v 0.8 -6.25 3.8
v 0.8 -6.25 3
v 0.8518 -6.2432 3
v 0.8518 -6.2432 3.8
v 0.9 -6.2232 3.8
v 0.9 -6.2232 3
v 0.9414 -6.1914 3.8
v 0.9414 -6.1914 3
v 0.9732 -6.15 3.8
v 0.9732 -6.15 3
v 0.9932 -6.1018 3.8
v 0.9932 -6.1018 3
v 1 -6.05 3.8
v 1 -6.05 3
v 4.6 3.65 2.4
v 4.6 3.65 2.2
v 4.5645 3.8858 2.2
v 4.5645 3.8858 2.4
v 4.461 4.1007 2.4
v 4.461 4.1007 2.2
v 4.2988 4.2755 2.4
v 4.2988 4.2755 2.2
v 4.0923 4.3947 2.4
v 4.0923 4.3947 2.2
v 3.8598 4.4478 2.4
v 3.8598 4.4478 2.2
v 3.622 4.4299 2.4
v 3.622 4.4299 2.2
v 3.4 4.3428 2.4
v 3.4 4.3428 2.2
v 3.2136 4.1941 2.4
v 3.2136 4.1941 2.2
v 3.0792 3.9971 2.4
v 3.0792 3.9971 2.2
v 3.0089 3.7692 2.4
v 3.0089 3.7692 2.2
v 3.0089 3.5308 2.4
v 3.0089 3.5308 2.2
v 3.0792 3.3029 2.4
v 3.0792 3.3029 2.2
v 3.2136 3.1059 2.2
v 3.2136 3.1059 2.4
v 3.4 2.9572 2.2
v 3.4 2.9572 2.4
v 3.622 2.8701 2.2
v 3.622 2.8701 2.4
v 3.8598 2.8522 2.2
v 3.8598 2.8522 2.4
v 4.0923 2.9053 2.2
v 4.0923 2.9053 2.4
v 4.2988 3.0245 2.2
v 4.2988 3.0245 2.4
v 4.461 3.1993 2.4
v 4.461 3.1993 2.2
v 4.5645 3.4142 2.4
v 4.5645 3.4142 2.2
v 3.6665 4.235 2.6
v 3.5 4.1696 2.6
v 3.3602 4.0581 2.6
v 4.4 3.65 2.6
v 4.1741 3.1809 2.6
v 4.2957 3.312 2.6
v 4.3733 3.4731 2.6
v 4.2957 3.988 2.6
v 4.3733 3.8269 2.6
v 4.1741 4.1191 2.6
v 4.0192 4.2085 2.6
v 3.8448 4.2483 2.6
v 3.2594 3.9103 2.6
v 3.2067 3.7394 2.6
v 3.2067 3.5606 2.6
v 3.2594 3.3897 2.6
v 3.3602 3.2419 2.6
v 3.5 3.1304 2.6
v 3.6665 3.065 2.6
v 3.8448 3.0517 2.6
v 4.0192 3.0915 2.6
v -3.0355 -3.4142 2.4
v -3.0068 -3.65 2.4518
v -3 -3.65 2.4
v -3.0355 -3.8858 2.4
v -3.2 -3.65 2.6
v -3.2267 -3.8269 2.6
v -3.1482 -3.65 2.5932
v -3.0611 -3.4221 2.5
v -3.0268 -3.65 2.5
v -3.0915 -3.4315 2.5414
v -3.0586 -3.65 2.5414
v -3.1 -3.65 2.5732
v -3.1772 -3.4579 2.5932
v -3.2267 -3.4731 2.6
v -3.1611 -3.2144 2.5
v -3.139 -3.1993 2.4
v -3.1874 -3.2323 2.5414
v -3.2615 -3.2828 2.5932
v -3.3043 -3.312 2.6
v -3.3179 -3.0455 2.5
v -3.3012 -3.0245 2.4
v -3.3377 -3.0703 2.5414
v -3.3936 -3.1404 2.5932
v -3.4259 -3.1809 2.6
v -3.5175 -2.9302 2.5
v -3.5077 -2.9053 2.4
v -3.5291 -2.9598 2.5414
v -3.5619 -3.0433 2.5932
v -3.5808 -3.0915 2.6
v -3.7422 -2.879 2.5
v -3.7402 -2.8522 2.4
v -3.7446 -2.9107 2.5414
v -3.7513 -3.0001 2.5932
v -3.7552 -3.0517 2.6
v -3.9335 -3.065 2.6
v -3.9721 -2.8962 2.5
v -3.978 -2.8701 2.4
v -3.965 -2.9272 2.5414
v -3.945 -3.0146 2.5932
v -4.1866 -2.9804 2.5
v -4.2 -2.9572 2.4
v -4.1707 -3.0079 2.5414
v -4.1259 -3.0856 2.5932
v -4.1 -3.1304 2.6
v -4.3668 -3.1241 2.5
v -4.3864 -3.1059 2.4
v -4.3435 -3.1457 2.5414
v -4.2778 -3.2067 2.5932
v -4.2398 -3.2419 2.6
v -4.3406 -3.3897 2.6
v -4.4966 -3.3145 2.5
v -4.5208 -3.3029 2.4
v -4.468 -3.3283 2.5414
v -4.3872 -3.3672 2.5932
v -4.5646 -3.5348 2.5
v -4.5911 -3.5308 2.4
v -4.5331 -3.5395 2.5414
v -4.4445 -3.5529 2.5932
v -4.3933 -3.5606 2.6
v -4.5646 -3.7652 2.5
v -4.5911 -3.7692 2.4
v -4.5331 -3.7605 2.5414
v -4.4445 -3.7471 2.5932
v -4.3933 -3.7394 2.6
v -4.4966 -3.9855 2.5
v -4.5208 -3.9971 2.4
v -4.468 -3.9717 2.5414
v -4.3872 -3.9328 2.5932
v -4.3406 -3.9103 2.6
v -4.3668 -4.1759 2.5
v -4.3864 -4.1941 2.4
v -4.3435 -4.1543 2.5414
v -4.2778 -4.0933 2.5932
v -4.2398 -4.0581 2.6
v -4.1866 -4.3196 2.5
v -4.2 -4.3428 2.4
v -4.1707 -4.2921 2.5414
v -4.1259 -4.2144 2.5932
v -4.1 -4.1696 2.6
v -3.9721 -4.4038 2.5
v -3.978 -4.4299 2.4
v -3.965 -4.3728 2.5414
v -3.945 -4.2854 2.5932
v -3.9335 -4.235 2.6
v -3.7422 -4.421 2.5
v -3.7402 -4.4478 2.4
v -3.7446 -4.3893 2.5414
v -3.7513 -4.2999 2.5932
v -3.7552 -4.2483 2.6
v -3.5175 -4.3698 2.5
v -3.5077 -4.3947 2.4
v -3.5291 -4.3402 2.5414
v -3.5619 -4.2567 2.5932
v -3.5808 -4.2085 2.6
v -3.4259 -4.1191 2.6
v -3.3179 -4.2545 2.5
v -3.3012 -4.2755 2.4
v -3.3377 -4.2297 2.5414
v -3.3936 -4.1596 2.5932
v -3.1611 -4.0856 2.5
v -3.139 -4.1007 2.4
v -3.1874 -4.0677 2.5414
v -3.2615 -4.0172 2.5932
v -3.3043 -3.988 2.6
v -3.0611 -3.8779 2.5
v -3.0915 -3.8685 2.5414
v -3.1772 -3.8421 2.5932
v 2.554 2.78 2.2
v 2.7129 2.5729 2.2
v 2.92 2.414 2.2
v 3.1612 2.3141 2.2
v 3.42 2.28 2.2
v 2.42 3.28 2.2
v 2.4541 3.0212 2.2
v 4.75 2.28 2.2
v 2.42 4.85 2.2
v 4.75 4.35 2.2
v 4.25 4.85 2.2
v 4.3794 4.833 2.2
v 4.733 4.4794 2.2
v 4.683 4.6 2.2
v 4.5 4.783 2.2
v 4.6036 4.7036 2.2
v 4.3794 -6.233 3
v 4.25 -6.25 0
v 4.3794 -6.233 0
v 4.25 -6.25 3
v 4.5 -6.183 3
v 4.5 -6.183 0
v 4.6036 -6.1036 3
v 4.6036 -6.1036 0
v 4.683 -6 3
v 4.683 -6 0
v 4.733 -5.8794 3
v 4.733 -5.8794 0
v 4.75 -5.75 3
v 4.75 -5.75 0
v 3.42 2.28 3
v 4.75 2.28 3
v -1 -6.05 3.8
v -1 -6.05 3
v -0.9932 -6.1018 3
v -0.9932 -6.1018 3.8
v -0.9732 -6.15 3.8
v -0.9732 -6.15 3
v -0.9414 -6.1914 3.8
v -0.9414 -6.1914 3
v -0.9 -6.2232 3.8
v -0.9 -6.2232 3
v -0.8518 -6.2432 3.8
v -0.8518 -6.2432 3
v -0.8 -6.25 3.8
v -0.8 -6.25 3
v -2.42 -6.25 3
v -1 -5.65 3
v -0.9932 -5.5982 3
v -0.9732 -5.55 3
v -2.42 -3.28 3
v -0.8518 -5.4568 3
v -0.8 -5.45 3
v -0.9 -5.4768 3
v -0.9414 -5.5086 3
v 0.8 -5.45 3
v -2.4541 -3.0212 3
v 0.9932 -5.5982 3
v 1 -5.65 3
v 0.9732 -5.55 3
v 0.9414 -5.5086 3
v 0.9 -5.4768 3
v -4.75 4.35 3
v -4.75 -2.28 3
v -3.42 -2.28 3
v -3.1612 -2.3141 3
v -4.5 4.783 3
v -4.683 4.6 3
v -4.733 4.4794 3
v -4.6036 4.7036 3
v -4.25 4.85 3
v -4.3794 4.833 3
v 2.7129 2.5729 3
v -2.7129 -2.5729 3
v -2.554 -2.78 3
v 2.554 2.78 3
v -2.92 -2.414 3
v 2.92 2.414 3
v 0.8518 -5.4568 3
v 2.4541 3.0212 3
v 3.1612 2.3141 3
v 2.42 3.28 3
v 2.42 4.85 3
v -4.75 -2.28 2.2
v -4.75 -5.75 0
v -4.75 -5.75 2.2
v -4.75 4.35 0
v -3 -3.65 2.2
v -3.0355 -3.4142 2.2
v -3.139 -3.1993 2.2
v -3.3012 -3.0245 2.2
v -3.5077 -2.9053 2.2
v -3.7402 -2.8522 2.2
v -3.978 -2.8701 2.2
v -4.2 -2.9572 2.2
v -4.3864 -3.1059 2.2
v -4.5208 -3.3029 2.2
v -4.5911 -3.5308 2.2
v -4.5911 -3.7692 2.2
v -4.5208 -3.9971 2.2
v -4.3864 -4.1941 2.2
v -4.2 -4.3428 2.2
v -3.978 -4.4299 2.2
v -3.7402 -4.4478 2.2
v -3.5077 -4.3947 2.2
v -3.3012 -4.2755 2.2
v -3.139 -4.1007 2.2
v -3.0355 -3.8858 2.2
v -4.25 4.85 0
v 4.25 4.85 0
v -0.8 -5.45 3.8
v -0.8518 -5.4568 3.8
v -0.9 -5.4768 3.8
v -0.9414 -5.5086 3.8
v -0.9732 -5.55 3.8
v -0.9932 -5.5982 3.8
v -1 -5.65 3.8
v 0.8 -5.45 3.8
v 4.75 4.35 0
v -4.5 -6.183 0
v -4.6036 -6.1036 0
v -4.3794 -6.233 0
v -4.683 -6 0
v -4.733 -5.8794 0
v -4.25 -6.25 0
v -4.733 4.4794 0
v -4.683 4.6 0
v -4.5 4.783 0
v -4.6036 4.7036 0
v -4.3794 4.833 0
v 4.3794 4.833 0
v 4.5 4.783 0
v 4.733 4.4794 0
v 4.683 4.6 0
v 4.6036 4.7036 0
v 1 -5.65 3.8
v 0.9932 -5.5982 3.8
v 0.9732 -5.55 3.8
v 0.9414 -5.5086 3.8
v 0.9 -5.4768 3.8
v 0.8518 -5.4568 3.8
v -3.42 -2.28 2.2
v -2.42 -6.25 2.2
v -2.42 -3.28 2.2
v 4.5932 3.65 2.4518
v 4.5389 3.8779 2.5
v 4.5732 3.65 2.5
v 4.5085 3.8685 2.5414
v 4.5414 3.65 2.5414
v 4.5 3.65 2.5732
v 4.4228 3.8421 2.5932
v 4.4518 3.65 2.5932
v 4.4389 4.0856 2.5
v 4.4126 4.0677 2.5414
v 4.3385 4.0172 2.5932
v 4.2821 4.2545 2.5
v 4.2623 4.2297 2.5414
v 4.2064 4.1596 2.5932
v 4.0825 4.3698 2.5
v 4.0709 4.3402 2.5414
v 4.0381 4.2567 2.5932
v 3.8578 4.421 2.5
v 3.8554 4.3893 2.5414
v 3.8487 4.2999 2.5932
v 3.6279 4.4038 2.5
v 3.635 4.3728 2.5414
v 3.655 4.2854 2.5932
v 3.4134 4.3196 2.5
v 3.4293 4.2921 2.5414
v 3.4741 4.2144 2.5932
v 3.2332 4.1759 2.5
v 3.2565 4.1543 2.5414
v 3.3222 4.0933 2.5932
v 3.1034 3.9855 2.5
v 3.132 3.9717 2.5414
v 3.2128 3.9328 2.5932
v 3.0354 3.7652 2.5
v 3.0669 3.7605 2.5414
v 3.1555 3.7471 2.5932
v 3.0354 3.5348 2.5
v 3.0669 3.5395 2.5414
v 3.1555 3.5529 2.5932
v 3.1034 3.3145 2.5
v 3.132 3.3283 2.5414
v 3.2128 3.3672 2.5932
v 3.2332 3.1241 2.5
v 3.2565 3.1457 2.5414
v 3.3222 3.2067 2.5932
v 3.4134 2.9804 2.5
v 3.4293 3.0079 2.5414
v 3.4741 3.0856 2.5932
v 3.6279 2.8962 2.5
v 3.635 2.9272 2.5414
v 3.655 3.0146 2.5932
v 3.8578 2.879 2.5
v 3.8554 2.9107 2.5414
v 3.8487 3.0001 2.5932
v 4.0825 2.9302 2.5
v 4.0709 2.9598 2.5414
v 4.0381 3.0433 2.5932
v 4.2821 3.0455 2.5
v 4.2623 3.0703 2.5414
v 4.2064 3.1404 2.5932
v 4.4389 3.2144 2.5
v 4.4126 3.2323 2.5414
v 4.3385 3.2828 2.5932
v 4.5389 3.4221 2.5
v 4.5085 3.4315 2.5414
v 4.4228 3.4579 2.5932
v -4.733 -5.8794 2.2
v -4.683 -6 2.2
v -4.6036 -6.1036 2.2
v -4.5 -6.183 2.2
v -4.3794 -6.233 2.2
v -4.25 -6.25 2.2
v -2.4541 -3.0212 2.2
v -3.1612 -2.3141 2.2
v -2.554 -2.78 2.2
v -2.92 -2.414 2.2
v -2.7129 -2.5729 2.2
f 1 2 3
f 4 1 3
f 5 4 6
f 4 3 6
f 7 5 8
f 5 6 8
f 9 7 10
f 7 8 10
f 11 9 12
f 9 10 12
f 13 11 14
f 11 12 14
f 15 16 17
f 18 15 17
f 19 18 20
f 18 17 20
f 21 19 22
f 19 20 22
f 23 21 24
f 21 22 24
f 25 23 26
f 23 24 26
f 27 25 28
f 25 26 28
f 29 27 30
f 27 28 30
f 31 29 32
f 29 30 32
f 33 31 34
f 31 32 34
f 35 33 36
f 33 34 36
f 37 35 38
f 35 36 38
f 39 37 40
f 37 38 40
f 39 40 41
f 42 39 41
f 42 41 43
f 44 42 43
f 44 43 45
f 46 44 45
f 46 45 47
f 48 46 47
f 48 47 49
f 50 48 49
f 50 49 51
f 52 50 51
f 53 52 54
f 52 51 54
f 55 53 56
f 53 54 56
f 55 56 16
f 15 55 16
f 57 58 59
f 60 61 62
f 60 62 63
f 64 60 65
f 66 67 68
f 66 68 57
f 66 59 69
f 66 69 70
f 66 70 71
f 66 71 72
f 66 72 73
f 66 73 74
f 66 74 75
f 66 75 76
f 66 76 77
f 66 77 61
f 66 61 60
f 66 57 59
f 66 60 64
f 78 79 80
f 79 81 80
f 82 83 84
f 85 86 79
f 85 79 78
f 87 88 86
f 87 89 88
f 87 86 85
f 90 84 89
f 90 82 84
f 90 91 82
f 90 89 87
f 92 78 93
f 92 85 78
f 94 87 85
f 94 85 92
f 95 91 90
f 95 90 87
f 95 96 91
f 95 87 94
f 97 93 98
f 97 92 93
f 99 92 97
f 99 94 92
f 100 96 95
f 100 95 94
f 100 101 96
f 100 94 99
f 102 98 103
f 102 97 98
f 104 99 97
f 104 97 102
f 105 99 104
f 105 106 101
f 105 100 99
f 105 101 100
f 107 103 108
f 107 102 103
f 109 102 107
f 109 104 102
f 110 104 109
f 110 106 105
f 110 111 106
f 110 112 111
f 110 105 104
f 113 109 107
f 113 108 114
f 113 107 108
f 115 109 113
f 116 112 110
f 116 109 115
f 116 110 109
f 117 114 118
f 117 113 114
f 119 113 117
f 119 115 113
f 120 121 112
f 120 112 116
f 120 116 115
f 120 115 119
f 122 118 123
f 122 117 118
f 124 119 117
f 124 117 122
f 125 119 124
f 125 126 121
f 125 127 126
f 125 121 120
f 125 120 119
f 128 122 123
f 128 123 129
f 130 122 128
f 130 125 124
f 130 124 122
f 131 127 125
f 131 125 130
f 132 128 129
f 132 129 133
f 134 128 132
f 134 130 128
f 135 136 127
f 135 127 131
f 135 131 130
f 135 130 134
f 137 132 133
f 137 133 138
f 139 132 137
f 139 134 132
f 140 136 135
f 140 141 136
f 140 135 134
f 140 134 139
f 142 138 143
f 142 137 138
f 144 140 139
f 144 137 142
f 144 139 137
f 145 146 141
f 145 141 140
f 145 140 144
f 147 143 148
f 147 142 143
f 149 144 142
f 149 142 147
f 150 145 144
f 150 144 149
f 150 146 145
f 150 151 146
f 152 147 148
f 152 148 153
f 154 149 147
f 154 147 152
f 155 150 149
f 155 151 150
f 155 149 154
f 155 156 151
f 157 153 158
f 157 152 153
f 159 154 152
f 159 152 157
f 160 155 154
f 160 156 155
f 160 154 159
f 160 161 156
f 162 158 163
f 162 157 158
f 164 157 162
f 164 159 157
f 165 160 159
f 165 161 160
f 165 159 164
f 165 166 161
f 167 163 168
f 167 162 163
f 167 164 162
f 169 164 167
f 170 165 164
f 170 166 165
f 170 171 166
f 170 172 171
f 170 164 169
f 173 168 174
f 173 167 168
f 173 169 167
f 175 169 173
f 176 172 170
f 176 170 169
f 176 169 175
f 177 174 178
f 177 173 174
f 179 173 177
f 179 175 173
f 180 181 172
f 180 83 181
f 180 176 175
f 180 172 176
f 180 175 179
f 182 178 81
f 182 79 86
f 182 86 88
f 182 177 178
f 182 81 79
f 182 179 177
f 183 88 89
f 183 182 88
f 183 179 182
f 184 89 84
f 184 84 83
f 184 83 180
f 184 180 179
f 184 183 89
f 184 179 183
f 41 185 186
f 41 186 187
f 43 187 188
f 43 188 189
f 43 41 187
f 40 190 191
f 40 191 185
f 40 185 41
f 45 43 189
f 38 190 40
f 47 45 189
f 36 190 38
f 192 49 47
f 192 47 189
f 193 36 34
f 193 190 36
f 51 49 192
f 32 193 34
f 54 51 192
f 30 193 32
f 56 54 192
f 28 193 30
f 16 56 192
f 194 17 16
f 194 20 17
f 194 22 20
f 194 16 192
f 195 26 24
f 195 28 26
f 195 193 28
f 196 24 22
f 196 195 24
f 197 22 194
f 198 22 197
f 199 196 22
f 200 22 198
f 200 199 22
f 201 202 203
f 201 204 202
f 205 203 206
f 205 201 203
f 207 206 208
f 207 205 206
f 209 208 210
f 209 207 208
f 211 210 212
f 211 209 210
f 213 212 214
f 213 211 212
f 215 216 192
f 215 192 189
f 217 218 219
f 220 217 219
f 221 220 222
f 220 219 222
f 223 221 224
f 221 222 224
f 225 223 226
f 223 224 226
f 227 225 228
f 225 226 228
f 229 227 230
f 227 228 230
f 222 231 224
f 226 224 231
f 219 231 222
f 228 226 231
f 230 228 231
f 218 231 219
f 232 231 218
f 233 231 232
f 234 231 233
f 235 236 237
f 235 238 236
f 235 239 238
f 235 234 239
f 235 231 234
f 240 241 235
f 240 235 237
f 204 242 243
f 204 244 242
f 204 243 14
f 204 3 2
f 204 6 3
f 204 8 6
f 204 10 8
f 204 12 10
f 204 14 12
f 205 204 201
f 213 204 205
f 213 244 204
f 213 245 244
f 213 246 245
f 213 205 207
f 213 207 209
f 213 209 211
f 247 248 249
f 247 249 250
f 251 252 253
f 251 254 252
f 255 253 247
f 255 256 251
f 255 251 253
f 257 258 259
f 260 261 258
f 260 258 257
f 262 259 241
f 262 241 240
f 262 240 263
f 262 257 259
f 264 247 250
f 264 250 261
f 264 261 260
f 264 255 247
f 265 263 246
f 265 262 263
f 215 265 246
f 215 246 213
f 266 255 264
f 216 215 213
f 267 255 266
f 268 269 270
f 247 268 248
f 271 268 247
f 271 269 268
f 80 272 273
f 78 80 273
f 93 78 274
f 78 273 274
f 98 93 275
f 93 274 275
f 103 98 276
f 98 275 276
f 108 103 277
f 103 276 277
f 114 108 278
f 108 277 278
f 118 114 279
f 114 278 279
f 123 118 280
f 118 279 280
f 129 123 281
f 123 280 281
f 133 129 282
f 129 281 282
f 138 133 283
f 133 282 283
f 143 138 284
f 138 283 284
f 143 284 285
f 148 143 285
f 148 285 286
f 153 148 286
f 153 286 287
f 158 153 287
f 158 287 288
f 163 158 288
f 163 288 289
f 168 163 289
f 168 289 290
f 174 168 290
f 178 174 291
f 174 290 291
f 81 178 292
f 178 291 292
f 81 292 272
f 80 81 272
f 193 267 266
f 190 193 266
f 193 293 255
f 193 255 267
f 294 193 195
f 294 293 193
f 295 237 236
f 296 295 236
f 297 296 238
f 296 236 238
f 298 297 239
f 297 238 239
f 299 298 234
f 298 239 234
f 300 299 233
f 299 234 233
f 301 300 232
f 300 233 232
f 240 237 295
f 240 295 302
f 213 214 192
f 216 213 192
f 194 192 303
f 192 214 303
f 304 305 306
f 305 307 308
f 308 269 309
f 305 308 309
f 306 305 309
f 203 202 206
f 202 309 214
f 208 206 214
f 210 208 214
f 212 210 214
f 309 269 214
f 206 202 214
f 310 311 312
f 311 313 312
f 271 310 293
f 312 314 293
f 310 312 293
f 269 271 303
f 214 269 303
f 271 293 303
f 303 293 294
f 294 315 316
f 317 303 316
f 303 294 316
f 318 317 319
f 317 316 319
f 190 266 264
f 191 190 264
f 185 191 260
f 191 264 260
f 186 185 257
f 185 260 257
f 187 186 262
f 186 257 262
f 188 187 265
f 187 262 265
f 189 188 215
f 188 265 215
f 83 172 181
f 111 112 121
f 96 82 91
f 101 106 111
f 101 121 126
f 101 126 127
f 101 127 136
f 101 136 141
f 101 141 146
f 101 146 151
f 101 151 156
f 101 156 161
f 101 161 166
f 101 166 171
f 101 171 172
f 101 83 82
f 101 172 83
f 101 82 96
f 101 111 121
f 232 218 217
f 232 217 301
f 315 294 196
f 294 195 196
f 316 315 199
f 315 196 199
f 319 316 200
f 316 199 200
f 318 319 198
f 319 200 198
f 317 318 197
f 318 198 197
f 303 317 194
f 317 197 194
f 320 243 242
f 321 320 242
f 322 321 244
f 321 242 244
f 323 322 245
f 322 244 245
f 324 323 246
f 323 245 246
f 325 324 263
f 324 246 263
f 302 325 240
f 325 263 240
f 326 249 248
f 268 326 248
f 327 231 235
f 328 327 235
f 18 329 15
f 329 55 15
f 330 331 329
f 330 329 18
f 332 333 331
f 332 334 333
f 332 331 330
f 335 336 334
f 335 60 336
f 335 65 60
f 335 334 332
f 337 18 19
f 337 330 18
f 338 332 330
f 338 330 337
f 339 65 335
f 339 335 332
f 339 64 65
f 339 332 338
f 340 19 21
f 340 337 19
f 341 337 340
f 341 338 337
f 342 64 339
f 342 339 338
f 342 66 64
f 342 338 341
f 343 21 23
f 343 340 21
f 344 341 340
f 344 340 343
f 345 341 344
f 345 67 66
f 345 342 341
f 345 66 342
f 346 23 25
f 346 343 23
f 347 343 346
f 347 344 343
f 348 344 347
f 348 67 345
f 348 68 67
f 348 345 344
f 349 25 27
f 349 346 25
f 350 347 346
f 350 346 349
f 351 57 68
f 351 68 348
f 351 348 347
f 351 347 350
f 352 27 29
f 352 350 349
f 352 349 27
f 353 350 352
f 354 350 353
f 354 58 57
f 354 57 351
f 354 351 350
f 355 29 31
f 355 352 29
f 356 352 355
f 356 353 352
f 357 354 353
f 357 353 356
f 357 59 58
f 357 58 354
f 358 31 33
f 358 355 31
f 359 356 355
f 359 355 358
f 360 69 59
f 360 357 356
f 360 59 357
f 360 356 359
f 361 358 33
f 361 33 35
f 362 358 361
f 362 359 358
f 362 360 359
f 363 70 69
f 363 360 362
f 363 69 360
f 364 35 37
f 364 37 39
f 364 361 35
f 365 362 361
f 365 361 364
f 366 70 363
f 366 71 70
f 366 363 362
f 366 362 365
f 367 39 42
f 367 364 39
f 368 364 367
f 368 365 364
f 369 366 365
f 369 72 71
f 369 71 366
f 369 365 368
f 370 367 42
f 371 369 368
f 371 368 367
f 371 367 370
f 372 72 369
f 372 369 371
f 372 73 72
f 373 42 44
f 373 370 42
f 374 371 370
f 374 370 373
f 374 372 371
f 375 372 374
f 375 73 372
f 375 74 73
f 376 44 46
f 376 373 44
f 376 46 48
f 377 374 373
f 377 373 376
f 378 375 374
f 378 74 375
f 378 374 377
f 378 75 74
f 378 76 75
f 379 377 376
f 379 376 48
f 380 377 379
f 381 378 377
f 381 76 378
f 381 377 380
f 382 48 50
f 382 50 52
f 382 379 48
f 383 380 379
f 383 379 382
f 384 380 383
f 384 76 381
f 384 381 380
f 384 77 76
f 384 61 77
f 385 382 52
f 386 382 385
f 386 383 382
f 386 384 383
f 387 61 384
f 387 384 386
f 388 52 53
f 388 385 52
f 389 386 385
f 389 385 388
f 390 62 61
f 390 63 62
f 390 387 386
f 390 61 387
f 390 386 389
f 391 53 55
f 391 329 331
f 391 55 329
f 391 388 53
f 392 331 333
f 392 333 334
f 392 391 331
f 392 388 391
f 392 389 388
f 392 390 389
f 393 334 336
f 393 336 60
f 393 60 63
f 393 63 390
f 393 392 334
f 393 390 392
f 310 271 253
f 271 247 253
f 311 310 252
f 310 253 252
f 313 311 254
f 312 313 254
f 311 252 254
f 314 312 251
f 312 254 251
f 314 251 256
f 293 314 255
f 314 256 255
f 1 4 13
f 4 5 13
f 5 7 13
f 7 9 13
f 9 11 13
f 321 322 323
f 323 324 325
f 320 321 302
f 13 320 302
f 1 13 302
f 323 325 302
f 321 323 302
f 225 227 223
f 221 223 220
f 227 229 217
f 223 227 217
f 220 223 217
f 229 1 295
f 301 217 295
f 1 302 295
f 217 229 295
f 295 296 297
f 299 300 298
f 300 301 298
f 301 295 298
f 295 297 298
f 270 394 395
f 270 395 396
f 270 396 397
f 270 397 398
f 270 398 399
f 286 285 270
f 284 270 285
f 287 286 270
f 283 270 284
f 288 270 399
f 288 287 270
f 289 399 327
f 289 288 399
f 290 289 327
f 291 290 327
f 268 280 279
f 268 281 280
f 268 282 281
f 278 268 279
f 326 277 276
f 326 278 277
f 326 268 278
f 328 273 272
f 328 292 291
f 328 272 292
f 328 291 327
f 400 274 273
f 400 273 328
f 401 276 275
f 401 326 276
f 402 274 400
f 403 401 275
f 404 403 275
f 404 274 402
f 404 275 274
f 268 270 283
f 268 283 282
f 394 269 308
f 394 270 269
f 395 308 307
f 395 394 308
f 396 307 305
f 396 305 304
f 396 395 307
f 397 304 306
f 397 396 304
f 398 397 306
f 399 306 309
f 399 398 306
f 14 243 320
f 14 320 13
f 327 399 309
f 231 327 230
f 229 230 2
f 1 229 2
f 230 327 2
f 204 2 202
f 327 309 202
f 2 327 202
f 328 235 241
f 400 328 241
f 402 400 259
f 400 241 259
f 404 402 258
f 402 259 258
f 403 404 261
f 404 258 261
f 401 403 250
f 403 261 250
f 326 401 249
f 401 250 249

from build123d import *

# Parameters (mm, degrees)
SKETCH_W     = 9.5
SKETCH_H     = 11.1
PAD_DEPTH    = 3
POCKET_DEPTH = 0.8
SKETCH002_R  = 0.8
PAD001_DEPTH = 0.4
SKETCH003_R  = 0.8
PAD002_DEPTH = 0.4
FILLET_R     = 0.2
FILLET001_R  = 0.5
PAD003_DEPTH = 0.8


with BuildPart() as part:
    # Sketch → Pad (new body)
    with BuildSketch(Plane.XY):
        with Locations((0, -0.7)):
            Rectangle(SKETCH_W, SKETCH_H)
    extrude(amount=PAD_DEPTH)

    # Sketch001 (on Face6 of Pad) → Pocket (cut)
    with BuildSketch(Plane.XY.offset(3)):
        with BuildLine():
            Line((-3.42, -2.28), (-4.75, -2.28))
            Line((-4.75, -2.28), (-4.75, -6.25))
            Line((-4.75, -6.25), (-2.42, -6.25))
            Line((-2.42, -6.25), (-2.42, -3.28))
            ThreePointArc((-2.42, -3.28), (-2.712893, -2.572893), (-3.42, -2.28))
        make_face()
        with BuildLine():
            Line((4.75, 2.28), (4.75, 4.85))
            Line((4.75, 4.85), (2.42, 4.85))
            Line((2.42, 4.85), (2.42, 3.28))
            ThreePointArc((2.42, 3.28), (2.712893, 2.572893), (3.42, 2.28))
            Line((4.75, 2.28), (3.42, 2.28))
        make_face()
    extrude(amount=-POCKET_DEPTH, mode=Mode.SUBTRACT)

    # Sketch002 (on Face4 of Pocket) → Pad001 (join)
    with BuildSketch(Plane.XY.offset(2.2)):
        with Locations((-3.8, -3.65)):
            Circle(SKETCH002_R)
    extrude(amount=PAD001_DEPTH)

    # Sketch003 (on Face4 of Pad001) → Pad002 (join)
    with BuildSketch(Plane.XY.offset(2.2)):
        with Locations((3.8, 3.65)):
            Circle(SKETCH003_R)
    extrude(amount=PAD002_DEPTH)

    # Fillet
    fillet_edges = [part.edges().sort_by_distance(p)[0] for p in [
        (-4.6, -3.65, 2.6),
        (3, 3.65, 2.6),
    ]]
    fillet(fillet_edges, radius=FILLET_R)

    # Fillet001
    fillet001_edges = [part.edges().sort_by_distance(p)[0] for p in [
        (4.75, 4.85, 1.1),
        (-4.75, 4.85, 1.5),
        (-4.75, -6.25, 1.1),
        (4.75, -6.25, 1.5),
    ]]
    fillet(fillet001_edges, radius=FILLET001_R)

    # Sketch005 (on Face11 of Fillet001) → Pad003 (join)
    with BuildSketch(Plane.XY.offset(3)):
        with BuildLine():
            Line((-0.8, -5.45), (0.8, -5.45))
            ThreePointArc((1, -5.65), (0.941421, -5.508579), (0.8, -5.45))
            Line((1, -5.65), (1, -6.05))
            ThreePointArc((0.8, -6.25), (0.941421, -6.191421), (1, -6.05))
            Line((0.8, -6.25), (-0.8, -6.25))
            ThreePointArc((-1, -6.05), (-0.941421, -6.191421), (-0.8, -6.25))
            Line((-1, -6.05), (-1, -5.65))
            ThreePointArc((-0.8, -5.45), (-0.941421, -5.508579), (-1, -5.65))
        make_face()
    extrude(amount=PAD003_DEPTH)


solid = part.part
